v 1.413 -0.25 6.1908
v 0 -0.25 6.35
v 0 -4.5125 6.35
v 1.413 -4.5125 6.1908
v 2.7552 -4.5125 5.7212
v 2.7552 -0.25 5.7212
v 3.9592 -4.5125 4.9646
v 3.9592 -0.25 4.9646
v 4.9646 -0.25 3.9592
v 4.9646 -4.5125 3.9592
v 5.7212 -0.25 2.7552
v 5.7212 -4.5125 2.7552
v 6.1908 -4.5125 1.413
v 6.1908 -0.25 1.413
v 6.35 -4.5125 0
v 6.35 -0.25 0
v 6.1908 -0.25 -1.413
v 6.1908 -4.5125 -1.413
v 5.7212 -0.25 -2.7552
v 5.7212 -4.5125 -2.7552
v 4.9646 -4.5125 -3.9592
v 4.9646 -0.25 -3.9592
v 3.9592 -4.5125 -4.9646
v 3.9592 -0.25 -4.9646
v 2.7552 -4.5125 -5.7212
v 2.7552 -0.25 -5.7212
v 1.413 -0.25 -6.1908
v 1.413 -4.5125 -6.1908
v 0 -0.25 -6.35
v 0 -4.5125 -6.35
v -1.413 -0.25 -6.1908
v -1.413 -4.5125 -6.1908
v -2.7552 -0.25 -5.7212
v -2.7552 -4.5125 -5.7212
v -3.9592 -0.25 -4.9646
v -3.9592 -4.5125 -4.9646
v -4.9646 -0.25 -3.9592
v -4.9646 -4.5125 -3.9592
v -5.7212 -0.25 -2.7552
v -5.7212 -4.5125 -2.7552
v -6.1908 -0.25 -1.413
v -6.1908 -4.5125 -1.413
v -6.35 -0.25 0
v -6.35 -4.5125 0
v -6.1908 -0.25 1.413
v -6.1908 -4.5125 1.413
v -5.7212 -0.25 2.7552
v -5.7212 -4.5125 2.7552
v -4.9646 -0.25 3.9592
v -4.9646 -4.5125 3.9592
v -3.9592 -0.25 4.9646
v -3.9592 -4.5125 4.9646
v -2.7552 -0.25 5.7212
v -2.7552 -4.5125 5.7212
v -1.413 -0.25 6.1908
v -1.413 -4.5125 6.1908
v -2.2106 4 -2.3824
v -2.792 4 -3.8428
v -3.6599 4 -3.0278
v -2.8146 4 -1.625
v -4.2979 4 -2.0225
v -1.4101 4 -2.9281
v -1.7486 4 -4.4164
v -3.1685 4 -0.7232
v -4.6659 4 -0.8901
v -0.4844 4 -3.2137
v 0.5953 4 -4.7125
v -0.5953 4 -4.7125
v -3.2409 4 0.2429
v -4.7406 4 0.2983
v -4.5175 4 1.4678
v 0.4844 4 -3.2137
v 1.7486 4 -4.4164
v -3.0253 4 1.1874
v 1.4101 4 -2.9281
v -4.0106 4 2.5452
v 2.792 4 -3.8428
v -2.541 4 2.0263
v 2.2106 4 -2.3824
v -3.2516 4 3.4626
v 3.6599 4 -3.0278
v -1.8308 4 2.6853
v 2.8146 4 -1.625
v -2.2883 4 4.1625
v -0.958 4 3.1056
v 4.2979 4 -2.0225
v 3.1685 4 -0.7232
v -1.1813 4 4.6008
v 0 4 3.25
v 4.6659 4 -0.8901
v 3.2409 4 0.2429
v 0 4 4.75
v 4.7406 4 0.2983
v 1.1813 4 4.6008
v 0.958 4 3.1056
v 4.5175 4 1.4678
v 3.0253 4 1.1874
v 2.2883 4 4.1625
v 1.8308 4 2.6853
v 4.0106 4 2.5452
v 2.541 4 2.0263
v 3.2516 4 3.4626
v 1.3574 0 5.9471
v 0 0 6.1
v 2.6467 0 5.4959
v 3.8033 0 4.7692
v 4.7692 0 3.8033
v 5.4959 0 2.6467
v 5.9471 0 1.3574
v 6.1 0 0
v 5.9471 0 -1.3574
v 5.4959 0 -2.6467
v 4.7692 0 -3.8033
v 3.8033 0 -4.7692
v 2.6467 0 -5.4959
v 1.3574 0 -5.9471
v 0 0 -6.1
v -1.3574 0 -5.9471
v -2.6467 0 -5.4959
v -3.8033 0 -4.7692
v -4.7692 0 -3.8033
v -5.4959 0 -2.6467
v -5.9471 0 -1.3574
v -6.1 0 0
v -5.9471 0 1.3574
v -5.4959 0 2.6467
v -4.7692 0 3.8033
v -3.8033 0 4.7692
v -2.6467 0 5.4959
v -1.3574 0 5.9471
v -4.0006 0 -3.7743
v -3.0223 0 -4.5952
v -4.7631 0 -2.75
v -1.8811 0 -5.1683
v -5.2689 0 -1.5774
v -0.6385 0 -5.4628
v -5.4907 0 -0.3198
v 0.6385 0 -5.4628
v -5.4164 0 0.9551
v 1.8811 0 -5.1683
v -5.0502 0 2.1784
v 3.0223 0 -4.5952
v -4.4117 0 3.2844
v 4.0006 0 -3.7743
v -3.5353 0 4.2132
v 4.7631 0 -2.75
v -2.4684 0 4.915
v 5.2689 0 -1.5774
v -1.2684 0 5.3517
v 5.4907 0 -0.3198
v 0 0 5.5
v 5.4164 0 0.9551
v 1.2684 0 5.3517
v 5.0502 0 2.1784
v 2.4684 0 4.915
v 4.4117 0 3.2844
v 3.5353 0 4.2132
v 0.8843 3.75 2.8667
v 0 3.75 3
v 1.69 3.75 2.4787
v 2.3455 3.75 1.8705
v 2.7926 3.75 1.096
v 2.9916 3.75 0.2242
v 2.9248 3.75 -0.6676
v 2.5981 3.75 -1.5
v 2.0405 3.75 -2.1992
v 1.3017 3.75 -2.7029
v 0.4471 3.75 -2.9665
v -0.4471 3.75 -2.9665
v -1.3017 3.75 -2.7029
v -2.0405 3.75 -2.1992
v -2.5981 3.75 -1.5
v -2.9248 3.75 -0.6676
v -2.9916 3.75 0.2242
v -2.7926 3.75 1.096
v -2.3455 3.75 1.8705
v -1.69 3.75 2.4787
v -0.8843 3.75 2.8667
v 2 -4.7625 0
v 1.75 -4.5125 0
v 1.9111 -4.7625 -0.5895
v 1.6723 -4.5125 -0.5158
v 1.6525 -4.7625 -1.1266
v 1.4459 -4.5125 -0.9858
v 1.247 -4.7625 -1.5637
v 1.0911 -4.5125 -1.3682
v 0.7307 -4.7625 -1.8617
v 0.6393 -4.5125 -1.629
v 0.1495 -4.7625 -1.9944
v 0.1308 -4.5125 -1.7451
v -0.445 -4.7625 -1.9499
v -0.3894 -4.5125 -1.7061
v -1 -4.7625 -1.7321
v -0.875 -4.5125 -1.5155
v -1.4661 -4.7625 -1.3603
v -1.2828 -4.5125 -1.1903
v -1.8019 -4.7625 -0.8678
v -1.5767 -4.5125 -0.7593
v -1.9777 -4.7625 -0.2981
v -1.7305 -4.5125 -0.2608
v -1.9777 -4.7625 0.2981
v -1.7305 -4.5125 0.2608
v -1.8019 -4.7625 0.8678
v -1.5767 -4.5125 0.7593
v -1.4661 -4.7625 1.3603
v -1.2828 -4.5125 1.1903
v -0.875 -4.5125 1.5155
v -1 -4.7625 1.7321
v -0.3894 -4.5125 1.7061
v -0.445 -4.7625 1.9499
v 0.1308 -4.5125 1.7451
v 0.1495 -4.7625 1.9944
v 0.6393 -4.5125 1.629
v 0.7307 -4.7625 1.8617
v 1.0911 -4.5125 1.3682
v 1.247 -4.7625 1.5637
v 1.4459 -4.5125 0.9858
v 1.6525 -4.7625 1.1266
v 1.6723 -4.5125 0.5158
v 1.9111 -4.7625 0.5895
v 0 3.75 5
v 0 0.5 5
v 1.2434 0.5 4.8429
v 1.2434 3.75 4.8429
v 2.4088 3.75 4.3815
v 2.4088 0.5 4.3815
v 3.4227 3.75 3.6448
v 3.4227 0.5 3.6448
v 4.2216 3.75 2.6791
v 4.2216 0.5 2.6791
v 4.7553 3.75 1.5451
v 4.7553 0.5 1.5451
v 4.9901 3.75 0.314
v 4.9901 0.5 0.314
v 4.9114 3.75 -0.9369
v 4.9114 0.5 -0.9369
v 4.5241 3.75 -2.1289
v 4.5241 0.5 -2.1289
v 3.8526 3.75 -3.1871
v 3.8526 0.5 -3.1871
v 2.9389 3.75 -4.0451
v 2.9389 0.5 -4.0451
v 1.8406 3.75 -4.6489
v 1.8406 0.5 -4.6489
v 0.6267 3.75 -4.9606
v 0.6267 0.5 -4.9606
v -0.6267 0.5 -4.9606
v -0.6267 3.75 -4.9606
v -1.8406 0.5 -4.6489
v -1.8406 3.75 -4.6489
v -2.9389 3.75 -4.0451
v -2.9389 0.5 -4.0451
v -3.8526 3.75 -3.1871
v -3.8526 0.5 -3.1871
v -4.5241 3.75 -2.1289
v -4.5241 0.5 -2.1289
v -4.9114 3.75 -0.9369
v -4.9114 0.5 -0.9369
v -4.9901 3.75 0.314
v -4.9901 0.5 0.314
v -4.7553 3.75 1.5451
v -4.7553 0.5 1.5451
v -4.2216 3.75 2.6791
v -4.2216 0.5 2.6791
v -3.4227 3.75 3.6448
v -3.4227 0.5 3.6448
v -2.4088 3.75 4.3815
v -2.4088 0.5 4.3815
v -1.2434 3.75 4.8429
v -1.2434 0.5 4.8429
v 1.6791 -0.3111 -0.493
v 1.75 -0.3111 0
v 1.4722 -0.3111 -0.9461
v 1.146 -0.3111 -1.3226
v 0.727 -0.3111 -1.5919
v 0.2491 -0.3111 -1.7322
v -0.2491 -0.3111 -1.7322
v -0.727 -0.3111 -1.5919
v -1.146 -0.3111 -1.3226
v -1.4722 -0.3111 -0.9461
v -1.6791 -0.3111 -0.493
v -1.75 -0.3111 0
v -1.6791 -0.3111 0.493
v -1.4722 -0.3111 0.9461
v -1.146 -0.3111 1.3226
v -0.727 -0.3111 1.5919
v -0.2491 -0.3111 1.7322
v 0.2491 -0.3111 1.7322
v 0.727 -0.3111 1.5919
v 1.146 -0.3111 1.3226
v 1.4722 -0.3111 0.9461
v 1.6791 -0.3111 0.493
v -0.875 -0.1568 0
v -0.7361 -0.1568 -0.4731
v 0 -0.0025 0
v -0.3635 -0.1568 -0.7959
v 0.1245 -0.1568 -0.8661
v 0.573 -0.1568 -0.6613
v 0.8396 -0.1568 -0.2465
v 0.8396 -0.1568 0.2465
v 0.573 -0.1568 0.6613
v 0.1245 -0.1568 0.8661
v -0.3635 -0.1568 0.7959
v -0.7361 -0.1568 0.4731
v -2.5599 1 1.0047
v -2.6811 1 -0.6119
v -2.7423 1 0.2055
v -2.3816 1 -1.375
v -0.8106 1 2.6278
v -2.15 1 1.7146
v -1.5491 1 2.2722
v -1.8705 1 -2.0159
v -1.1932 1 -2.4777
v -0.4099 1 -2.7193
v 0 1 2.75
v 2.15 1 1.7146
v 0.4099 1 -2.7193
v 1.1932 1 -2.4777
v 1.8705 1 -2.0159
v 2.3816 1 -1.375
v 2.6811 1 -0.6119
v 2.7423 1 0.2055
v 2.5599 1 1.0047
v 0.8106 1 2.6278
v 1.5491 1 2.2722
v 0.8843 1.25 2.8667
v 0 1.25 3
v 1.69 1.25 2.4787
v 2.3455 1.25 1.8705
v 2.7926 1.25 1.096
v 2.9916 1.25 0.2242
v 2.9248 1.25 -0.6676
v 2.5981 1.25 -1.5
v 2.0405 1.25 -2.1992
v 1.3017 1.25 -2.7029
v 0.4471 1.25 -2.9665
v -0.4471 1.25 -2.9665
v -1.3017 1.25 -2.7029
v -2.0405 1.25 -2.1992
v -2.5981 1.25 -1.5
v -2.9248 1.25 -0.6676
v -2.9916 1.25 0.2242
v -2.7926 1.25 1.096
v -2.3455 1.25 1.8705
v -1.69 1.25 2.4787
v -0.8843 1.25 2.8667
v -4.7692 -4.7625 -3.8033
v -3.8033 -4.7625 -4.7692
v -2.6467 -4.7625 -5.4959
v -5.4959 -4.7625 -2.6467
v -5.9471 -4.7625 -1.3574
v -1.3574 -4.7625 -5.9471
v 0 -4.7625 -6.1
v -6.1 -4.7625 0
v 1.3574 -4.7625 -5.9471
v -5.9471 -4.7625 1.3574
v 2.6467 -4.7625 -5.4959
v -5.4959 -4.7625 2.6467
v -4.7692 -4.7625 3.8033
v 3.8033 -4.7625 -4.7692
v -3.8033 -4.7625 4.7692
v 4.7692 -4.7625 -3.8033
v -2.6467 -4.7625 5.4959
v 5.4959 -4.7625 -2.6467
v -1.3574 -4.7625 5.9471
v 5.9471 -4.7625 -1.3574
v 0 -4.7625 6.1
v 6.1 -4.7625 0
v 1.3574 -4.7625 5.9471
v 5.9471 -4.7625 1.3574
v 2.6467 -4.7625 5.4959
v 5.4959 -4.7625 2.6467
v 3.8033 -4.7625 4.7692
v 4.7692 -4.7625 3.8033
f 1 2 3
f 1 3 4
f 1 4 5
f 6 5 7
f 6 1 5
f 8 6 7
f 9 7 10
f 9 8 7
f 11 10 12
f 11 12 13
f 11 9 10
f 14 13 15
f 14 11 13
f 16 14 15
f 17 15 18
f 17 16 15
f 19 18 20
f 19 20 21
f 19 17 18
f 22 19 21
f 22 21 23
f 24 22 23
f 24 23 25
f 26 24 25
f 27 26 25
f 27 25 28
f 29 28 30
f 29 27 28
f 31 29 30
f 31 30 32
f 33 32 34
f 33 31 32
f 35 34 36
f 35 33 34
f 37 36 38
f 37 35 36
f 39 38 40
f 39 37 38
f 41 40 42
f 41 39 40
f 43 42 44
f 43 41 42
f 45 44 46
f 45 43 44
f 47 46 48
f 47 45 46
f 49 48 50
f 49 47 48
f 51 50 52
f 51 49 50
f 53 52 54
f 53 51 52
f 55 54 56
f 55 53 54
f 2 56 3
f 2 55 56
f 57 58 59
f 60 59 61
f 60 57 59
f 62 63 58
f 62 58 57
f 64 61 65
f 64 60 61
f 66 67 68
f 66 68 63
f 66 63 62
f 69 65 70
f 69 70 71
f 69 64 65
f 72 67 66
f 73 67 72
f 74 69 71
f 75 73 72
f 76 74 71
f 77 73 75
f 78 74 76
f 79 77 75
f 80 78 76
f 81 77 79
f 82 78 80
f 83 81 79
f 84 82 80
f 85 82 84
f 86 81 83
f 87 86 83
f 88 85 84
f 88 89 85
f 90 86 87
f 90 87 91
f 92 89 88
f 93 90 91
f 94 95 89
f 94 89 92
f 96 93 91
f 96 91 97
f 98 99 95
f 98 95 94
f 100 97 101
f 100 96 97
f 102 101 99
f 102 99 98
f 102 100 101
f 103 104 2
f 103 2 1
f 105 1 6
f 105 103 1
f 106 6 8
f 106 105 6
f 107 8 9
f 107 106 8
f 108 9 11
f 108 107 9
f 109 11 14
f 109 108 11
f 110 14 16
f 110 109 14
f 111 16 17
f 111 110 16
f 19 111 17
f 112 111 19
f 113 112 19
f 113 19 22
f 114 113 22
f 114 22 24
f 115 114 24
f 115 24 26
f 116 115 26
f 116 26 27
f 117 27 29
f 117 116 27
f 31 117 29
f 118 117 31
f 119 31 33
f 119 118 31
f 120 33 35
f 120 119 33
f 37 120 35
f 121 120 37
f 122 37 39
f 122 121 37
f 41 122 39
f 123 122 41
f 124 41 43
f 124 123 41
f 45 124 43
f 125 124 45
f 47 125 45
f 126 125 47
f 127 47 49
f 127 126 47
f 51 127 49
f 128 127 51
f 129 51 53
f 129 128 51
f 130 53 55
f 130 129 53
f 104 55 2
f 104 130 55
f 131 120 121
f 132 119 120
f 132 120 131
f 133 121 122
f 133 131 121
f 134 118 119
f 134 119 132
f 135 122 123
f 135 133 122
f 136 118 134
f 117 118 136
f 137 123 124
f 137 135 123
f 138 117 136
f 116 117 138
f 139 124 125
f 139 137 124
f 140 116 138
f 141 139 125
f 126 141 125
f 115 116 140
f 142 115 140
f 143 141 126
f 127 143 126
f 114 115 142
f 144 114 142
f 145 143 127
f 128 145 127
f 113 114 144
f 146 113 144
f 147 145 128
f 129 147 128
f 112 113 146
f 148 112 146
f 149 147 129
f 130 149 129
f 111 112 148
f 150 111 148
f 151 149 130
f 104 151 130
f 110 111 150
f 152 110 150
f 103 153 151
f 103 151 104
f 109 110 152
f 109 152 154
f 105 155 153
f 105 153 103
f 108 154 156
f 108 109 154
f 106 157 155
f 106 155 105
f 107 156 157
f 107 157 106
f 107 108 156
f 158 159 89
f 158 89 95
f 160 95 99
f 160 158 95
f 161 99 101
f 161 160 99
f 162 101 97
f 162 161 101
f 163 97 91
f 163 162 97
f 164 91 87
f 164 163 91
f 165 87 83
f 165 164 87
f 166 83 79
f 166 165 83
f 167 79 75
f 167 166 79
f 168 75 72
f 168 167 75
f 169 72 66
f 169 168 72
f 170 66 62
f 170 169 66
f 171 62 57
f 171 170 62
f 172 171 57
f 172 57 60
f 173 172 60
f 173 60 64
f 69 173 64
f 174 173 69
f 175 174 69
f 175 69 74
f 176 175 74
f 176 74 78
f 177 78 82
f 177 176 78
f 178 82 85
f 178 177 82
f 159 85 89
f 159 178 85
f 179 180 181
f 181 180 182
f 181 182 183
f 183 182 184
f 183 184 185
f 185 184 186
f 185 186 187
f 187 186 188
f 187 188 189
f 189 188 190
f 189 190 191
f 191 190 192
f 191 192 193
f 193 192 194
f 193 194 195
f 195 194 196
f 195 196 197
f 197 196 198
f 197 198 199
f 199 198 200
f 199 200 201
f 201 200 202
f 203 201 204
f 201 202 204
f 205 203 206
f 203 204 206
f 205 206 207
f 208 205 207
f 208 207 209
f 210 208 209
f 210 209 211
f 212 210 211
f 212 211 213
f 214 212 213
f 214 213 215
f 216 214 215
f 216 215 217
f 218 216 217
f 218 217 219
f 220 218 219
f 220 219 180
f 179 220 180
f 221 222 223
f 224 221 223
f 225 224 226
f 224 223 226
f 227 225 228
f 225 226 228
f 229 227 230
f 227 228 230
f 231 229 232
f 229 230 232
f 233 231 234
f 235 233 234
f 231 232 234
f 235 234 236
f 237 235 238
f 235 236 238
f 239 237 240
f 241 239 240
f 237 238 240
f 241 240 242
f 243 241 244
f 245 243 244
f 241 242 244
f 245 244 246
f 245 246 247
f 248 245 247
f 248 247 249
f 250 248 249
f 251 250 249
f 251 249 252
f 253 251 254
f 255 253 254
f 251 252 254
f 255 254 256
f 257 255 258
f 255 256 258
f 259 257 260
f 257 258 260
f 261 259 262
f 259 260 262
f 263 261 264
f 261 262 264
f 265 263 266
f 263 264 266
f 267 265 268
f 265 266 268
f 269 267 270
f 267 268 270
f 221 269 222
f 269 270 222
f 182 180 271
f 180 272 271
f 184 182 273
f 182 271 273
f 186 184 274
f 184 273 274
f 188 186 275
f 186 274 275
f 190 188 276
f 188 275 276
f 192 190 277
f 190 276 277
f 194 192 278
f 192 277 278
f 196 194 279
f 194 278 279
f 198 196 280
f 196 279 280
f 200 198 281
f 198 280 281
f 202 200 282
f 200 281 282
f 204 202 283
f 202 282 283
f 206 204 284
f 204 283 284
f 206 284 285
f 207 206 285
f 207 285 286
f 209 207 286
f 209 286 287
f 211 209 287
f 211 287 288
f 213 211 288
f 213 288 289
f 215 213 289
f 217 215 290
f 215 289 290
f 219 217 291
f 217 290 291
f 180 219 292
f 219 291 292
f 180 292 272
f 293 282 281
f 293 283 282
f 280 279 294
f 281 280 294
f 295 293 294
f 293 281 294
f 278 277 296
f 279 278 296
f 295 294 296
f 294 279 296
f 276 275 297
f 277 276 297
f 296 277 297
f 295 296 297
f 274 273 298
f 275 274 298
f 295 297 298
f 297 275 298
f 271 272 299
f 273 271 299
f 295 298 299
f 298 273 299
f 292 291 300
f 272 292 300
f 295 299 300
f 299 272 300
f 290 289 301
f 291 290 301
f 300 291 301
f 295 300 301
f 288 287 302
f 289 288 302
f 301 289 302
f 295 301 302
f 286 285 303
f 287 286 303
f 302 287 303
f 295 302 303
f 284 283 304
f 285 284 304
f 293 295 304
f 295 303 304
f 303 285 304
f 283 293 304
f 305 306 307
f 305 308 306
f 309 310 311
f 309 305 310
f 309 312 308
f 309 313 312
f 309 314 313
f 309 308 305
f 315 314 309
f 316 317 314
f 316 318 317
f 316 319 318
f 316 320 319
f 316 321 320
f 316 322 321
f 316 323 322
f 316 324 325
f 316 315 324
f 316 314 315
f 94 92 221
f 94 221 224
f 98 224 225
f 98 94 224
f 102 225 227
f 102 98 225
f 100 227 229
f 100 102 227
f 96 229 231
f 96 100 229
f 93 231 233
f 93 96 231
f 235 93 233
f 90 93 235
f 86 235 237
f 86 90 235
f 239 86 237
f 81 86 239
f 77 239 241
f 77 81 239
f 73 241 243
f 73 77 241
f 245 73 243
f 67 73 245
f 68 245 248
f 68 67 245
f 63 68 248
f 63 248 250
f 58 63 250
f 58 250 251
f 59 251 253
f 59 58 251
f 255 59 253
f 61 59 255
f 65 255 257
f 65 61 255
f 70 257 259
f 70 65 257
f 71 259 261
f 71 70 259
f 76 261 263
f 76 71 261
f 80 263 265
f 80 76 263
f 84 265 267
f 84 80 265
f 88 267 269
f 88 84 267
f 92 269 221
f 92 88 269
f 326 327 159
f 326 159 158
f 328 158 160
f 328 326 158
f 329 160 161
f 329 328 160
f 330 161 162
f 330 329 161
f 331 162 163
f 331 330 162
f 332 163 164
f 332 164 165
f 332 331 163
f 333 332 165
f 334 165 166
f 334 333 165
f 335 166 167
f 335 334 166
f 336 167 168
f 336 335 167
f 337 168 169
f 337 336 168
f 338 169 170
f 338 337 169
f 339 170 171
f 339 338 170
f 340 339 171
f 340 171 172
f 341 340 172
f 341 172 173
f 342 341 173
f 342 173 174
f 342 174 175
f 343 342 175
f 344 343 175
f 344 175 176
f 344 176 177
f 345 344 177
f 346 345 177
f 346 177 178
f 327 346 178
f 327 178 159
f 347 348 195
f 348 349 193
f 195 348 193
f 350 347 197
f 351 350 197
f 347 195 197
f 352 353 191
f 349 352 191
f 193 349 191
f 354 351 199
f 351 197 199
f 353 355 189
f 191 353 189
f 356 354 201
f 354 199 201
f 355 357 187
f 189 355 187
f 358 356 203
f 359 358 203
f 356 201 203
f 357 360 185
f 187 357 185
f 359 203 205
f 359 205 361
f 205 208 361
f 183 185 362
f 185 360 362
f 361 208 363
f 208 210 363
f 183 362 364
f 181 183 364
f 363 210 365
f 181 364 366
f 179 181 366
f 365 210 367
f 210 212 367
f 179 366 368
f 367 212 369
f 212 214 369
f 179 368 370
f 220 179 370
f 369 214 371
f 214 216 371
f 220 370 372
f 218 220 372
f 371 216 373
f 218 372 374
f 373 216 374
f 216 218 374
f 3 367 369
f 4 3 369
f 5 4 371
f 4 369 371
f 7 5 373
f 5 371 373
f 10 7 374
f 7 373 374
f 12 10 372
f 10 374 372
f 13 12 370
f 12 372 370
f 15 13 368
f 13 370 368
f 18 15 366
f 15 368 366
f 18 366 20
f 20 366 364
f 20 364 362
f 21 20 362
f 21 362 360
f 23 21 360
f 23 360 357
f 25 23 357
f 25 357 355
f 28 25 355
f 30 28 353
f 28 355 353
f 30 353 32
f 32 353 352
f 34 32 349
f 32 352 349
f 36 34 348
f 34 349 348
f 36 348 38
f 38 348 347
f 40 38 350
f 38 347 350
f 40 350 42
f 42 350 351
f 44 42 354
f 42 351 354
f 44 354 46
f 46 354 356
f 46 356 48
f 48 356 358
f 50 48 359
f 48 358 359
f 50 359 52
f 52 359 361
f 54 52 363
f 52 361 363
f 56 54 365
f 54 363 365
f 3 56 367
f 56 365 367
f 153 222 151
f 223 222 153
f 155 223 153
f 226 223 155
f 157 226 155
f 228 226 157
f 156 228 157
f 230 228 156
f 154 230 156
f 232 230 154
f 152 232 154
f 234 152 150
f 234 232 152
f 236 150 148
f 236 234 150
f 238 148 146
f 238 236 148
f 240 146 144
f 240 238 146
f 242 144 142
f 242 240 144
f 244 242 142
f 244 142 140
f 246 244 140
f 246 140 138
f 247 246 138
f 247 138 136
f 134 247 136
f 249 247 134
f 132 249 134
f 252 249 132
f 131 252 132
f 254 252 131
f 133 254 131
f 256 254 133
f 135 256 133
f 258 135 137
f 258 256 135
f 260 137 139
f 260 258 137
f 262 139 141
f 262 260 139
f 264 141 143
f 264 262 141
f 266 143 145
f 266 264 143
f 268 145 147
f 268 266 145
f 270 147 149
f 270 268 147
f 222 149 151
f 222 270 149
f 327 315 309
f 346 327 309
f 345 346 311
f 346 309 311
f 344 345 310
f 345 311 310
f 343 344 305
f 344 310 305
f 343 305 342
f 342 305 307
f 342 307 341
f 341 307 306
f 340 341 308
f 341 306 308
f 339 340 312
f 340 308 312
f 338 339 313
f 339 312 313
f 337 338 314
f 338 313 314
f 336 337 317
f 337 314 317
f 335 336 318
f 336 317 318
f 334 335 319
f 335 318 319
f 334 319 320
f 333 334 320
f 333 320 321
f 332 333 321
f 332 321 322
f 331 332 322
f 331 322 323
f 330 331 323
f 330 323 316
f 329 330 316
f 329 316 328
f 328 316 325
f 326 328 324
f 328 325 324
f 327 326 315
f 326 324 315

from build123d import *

# Parameters (mm, degrees)
SKETCH1_R                            = 5
BOSS_EXTRUDE1_DEPTH                  = 1
SKETCH1_3_R                          = 5
SKETCH1_3_R_2                        = 3
BOSS_EXTRUDE2_DEPTH                  = 4
CHAMFER1_SIZE                        = 0.25
SKETCH5_R                            = 6.35
BOSS_EXTRUDE4_DEPTH                  = 4.7625
F_3_5_3_5_DIAMETER_HOLE1_D           = 3.5
F_3_5_3_5_DIAMETER_HOLE1_DEPTH       = 4.451427784
F_3_5_3_5_DIAMETER_HOLE1_CSINK_D     = 4
F_3_5_3_5_DIAMETER_HOLE1_CSINK_ANGLE = 90
F_3_5_3_5_DIAMETER_HOLE1_TIP         = 0.308572216
CHAMFER2_SIZE                        = 0.25
CHAMFER3_SIZE                        = 0.5


with BuildPart() as part:
    # Sketch1 → Boss-Extrude1 (new body)
    with BuildSketch(Plane(origin=(0, 0, 0), x_dir=(1, 0, 0), z_dir=(0, 1, 0))):
        Circle(SKETCH1_R)
    extrude(amount=BOSS_EXTRUDE1_DEPTH)

    # Sketch1<3> → Boss-Extrude2 (add)
    with BuildSketch(Plane(origin=(0, 0, 0), x_dir=(1, 0, 0), z_dir=(0, 1, 0))):
        Circle(SKETCH1_3_R)
        Circle(SKETCH1_3_R_2, mode=Mode.SUBTRACT)
    extrude(amount=BOSS_EXTRUDE2_DEPTH)

    # Chamfer1
    chamfer1_edges = [part.edges().sort_by_distance(p)[0] for p in [
        (-3, 4, 0),
        (-5, 4, 0),
        (-3, 1, 0),
    ]]
    chamfer(chamfer1_edges, length=CHAMFER1_SIZE)

    # Sketch5 → Boss-Extrude4 (add)
    with BuildSketch(Plane(origin=(0, 0, 0), x_dir=(1, 0, 0), z_dir=(0, 1, 0))):
        Circle(SKETCH5_R)
    extrude(amount=-BOSS_EXTRUDE4_DEPTH)

    # Ø3.5 (3.5) Diameter Hole1
    with Locations(Plane(origin=(0, -4.7625, 0), x_dir=(-1, 0, 0), z_dir=(0, -1, 0))):
        with Locations((0, 0)):
            CounterSinkHole(F_3_5_3_5_DIAMETER_HOLE1_D / 2, F_3_5_3_5_DIAMETER_HOLE1_CSINK_D / 2, depth=F_3_5_3_5_DIAMETER_HOLE1_DEPTH, counter_sink_angle=F_3_5_3_5_DIAMETER_HOLE1_CSINK_ANGLE)
            with Locations((0, 0, -(F_3_5_3_5_DIAMETER_HOLE1_DEPTH + F_3_5_3_5_DIAMETER_HOLE1_TIP / 2))):  # 160° drill point
                Cone(0, F_3_5_3_5_DIAMETER_HOLE1_D / 2, F_3_5_3_5_DIAMETER_HOLE1_TIP, mode=Mode.SUBTRACT)

    # Chamfer2
    chamfer2_edges = [part.edges().sort_by_distance(p)[0] for p in [
        (-6.35, -4.7625, 0),
        (-6.35, 0, 0),
    ]]
    chamfer(chamfer2_edges, length=CHAMFER2_SIZE)

    # Chamfer3
    chamfer3_edges = [part.edges().sort_by_distance(p)[0] for p in [
        (-5, 0, 0),
    ]]
    chamfer(chamfer3_edges, length=CHAMFER3_SIZE)


solid = part.part
